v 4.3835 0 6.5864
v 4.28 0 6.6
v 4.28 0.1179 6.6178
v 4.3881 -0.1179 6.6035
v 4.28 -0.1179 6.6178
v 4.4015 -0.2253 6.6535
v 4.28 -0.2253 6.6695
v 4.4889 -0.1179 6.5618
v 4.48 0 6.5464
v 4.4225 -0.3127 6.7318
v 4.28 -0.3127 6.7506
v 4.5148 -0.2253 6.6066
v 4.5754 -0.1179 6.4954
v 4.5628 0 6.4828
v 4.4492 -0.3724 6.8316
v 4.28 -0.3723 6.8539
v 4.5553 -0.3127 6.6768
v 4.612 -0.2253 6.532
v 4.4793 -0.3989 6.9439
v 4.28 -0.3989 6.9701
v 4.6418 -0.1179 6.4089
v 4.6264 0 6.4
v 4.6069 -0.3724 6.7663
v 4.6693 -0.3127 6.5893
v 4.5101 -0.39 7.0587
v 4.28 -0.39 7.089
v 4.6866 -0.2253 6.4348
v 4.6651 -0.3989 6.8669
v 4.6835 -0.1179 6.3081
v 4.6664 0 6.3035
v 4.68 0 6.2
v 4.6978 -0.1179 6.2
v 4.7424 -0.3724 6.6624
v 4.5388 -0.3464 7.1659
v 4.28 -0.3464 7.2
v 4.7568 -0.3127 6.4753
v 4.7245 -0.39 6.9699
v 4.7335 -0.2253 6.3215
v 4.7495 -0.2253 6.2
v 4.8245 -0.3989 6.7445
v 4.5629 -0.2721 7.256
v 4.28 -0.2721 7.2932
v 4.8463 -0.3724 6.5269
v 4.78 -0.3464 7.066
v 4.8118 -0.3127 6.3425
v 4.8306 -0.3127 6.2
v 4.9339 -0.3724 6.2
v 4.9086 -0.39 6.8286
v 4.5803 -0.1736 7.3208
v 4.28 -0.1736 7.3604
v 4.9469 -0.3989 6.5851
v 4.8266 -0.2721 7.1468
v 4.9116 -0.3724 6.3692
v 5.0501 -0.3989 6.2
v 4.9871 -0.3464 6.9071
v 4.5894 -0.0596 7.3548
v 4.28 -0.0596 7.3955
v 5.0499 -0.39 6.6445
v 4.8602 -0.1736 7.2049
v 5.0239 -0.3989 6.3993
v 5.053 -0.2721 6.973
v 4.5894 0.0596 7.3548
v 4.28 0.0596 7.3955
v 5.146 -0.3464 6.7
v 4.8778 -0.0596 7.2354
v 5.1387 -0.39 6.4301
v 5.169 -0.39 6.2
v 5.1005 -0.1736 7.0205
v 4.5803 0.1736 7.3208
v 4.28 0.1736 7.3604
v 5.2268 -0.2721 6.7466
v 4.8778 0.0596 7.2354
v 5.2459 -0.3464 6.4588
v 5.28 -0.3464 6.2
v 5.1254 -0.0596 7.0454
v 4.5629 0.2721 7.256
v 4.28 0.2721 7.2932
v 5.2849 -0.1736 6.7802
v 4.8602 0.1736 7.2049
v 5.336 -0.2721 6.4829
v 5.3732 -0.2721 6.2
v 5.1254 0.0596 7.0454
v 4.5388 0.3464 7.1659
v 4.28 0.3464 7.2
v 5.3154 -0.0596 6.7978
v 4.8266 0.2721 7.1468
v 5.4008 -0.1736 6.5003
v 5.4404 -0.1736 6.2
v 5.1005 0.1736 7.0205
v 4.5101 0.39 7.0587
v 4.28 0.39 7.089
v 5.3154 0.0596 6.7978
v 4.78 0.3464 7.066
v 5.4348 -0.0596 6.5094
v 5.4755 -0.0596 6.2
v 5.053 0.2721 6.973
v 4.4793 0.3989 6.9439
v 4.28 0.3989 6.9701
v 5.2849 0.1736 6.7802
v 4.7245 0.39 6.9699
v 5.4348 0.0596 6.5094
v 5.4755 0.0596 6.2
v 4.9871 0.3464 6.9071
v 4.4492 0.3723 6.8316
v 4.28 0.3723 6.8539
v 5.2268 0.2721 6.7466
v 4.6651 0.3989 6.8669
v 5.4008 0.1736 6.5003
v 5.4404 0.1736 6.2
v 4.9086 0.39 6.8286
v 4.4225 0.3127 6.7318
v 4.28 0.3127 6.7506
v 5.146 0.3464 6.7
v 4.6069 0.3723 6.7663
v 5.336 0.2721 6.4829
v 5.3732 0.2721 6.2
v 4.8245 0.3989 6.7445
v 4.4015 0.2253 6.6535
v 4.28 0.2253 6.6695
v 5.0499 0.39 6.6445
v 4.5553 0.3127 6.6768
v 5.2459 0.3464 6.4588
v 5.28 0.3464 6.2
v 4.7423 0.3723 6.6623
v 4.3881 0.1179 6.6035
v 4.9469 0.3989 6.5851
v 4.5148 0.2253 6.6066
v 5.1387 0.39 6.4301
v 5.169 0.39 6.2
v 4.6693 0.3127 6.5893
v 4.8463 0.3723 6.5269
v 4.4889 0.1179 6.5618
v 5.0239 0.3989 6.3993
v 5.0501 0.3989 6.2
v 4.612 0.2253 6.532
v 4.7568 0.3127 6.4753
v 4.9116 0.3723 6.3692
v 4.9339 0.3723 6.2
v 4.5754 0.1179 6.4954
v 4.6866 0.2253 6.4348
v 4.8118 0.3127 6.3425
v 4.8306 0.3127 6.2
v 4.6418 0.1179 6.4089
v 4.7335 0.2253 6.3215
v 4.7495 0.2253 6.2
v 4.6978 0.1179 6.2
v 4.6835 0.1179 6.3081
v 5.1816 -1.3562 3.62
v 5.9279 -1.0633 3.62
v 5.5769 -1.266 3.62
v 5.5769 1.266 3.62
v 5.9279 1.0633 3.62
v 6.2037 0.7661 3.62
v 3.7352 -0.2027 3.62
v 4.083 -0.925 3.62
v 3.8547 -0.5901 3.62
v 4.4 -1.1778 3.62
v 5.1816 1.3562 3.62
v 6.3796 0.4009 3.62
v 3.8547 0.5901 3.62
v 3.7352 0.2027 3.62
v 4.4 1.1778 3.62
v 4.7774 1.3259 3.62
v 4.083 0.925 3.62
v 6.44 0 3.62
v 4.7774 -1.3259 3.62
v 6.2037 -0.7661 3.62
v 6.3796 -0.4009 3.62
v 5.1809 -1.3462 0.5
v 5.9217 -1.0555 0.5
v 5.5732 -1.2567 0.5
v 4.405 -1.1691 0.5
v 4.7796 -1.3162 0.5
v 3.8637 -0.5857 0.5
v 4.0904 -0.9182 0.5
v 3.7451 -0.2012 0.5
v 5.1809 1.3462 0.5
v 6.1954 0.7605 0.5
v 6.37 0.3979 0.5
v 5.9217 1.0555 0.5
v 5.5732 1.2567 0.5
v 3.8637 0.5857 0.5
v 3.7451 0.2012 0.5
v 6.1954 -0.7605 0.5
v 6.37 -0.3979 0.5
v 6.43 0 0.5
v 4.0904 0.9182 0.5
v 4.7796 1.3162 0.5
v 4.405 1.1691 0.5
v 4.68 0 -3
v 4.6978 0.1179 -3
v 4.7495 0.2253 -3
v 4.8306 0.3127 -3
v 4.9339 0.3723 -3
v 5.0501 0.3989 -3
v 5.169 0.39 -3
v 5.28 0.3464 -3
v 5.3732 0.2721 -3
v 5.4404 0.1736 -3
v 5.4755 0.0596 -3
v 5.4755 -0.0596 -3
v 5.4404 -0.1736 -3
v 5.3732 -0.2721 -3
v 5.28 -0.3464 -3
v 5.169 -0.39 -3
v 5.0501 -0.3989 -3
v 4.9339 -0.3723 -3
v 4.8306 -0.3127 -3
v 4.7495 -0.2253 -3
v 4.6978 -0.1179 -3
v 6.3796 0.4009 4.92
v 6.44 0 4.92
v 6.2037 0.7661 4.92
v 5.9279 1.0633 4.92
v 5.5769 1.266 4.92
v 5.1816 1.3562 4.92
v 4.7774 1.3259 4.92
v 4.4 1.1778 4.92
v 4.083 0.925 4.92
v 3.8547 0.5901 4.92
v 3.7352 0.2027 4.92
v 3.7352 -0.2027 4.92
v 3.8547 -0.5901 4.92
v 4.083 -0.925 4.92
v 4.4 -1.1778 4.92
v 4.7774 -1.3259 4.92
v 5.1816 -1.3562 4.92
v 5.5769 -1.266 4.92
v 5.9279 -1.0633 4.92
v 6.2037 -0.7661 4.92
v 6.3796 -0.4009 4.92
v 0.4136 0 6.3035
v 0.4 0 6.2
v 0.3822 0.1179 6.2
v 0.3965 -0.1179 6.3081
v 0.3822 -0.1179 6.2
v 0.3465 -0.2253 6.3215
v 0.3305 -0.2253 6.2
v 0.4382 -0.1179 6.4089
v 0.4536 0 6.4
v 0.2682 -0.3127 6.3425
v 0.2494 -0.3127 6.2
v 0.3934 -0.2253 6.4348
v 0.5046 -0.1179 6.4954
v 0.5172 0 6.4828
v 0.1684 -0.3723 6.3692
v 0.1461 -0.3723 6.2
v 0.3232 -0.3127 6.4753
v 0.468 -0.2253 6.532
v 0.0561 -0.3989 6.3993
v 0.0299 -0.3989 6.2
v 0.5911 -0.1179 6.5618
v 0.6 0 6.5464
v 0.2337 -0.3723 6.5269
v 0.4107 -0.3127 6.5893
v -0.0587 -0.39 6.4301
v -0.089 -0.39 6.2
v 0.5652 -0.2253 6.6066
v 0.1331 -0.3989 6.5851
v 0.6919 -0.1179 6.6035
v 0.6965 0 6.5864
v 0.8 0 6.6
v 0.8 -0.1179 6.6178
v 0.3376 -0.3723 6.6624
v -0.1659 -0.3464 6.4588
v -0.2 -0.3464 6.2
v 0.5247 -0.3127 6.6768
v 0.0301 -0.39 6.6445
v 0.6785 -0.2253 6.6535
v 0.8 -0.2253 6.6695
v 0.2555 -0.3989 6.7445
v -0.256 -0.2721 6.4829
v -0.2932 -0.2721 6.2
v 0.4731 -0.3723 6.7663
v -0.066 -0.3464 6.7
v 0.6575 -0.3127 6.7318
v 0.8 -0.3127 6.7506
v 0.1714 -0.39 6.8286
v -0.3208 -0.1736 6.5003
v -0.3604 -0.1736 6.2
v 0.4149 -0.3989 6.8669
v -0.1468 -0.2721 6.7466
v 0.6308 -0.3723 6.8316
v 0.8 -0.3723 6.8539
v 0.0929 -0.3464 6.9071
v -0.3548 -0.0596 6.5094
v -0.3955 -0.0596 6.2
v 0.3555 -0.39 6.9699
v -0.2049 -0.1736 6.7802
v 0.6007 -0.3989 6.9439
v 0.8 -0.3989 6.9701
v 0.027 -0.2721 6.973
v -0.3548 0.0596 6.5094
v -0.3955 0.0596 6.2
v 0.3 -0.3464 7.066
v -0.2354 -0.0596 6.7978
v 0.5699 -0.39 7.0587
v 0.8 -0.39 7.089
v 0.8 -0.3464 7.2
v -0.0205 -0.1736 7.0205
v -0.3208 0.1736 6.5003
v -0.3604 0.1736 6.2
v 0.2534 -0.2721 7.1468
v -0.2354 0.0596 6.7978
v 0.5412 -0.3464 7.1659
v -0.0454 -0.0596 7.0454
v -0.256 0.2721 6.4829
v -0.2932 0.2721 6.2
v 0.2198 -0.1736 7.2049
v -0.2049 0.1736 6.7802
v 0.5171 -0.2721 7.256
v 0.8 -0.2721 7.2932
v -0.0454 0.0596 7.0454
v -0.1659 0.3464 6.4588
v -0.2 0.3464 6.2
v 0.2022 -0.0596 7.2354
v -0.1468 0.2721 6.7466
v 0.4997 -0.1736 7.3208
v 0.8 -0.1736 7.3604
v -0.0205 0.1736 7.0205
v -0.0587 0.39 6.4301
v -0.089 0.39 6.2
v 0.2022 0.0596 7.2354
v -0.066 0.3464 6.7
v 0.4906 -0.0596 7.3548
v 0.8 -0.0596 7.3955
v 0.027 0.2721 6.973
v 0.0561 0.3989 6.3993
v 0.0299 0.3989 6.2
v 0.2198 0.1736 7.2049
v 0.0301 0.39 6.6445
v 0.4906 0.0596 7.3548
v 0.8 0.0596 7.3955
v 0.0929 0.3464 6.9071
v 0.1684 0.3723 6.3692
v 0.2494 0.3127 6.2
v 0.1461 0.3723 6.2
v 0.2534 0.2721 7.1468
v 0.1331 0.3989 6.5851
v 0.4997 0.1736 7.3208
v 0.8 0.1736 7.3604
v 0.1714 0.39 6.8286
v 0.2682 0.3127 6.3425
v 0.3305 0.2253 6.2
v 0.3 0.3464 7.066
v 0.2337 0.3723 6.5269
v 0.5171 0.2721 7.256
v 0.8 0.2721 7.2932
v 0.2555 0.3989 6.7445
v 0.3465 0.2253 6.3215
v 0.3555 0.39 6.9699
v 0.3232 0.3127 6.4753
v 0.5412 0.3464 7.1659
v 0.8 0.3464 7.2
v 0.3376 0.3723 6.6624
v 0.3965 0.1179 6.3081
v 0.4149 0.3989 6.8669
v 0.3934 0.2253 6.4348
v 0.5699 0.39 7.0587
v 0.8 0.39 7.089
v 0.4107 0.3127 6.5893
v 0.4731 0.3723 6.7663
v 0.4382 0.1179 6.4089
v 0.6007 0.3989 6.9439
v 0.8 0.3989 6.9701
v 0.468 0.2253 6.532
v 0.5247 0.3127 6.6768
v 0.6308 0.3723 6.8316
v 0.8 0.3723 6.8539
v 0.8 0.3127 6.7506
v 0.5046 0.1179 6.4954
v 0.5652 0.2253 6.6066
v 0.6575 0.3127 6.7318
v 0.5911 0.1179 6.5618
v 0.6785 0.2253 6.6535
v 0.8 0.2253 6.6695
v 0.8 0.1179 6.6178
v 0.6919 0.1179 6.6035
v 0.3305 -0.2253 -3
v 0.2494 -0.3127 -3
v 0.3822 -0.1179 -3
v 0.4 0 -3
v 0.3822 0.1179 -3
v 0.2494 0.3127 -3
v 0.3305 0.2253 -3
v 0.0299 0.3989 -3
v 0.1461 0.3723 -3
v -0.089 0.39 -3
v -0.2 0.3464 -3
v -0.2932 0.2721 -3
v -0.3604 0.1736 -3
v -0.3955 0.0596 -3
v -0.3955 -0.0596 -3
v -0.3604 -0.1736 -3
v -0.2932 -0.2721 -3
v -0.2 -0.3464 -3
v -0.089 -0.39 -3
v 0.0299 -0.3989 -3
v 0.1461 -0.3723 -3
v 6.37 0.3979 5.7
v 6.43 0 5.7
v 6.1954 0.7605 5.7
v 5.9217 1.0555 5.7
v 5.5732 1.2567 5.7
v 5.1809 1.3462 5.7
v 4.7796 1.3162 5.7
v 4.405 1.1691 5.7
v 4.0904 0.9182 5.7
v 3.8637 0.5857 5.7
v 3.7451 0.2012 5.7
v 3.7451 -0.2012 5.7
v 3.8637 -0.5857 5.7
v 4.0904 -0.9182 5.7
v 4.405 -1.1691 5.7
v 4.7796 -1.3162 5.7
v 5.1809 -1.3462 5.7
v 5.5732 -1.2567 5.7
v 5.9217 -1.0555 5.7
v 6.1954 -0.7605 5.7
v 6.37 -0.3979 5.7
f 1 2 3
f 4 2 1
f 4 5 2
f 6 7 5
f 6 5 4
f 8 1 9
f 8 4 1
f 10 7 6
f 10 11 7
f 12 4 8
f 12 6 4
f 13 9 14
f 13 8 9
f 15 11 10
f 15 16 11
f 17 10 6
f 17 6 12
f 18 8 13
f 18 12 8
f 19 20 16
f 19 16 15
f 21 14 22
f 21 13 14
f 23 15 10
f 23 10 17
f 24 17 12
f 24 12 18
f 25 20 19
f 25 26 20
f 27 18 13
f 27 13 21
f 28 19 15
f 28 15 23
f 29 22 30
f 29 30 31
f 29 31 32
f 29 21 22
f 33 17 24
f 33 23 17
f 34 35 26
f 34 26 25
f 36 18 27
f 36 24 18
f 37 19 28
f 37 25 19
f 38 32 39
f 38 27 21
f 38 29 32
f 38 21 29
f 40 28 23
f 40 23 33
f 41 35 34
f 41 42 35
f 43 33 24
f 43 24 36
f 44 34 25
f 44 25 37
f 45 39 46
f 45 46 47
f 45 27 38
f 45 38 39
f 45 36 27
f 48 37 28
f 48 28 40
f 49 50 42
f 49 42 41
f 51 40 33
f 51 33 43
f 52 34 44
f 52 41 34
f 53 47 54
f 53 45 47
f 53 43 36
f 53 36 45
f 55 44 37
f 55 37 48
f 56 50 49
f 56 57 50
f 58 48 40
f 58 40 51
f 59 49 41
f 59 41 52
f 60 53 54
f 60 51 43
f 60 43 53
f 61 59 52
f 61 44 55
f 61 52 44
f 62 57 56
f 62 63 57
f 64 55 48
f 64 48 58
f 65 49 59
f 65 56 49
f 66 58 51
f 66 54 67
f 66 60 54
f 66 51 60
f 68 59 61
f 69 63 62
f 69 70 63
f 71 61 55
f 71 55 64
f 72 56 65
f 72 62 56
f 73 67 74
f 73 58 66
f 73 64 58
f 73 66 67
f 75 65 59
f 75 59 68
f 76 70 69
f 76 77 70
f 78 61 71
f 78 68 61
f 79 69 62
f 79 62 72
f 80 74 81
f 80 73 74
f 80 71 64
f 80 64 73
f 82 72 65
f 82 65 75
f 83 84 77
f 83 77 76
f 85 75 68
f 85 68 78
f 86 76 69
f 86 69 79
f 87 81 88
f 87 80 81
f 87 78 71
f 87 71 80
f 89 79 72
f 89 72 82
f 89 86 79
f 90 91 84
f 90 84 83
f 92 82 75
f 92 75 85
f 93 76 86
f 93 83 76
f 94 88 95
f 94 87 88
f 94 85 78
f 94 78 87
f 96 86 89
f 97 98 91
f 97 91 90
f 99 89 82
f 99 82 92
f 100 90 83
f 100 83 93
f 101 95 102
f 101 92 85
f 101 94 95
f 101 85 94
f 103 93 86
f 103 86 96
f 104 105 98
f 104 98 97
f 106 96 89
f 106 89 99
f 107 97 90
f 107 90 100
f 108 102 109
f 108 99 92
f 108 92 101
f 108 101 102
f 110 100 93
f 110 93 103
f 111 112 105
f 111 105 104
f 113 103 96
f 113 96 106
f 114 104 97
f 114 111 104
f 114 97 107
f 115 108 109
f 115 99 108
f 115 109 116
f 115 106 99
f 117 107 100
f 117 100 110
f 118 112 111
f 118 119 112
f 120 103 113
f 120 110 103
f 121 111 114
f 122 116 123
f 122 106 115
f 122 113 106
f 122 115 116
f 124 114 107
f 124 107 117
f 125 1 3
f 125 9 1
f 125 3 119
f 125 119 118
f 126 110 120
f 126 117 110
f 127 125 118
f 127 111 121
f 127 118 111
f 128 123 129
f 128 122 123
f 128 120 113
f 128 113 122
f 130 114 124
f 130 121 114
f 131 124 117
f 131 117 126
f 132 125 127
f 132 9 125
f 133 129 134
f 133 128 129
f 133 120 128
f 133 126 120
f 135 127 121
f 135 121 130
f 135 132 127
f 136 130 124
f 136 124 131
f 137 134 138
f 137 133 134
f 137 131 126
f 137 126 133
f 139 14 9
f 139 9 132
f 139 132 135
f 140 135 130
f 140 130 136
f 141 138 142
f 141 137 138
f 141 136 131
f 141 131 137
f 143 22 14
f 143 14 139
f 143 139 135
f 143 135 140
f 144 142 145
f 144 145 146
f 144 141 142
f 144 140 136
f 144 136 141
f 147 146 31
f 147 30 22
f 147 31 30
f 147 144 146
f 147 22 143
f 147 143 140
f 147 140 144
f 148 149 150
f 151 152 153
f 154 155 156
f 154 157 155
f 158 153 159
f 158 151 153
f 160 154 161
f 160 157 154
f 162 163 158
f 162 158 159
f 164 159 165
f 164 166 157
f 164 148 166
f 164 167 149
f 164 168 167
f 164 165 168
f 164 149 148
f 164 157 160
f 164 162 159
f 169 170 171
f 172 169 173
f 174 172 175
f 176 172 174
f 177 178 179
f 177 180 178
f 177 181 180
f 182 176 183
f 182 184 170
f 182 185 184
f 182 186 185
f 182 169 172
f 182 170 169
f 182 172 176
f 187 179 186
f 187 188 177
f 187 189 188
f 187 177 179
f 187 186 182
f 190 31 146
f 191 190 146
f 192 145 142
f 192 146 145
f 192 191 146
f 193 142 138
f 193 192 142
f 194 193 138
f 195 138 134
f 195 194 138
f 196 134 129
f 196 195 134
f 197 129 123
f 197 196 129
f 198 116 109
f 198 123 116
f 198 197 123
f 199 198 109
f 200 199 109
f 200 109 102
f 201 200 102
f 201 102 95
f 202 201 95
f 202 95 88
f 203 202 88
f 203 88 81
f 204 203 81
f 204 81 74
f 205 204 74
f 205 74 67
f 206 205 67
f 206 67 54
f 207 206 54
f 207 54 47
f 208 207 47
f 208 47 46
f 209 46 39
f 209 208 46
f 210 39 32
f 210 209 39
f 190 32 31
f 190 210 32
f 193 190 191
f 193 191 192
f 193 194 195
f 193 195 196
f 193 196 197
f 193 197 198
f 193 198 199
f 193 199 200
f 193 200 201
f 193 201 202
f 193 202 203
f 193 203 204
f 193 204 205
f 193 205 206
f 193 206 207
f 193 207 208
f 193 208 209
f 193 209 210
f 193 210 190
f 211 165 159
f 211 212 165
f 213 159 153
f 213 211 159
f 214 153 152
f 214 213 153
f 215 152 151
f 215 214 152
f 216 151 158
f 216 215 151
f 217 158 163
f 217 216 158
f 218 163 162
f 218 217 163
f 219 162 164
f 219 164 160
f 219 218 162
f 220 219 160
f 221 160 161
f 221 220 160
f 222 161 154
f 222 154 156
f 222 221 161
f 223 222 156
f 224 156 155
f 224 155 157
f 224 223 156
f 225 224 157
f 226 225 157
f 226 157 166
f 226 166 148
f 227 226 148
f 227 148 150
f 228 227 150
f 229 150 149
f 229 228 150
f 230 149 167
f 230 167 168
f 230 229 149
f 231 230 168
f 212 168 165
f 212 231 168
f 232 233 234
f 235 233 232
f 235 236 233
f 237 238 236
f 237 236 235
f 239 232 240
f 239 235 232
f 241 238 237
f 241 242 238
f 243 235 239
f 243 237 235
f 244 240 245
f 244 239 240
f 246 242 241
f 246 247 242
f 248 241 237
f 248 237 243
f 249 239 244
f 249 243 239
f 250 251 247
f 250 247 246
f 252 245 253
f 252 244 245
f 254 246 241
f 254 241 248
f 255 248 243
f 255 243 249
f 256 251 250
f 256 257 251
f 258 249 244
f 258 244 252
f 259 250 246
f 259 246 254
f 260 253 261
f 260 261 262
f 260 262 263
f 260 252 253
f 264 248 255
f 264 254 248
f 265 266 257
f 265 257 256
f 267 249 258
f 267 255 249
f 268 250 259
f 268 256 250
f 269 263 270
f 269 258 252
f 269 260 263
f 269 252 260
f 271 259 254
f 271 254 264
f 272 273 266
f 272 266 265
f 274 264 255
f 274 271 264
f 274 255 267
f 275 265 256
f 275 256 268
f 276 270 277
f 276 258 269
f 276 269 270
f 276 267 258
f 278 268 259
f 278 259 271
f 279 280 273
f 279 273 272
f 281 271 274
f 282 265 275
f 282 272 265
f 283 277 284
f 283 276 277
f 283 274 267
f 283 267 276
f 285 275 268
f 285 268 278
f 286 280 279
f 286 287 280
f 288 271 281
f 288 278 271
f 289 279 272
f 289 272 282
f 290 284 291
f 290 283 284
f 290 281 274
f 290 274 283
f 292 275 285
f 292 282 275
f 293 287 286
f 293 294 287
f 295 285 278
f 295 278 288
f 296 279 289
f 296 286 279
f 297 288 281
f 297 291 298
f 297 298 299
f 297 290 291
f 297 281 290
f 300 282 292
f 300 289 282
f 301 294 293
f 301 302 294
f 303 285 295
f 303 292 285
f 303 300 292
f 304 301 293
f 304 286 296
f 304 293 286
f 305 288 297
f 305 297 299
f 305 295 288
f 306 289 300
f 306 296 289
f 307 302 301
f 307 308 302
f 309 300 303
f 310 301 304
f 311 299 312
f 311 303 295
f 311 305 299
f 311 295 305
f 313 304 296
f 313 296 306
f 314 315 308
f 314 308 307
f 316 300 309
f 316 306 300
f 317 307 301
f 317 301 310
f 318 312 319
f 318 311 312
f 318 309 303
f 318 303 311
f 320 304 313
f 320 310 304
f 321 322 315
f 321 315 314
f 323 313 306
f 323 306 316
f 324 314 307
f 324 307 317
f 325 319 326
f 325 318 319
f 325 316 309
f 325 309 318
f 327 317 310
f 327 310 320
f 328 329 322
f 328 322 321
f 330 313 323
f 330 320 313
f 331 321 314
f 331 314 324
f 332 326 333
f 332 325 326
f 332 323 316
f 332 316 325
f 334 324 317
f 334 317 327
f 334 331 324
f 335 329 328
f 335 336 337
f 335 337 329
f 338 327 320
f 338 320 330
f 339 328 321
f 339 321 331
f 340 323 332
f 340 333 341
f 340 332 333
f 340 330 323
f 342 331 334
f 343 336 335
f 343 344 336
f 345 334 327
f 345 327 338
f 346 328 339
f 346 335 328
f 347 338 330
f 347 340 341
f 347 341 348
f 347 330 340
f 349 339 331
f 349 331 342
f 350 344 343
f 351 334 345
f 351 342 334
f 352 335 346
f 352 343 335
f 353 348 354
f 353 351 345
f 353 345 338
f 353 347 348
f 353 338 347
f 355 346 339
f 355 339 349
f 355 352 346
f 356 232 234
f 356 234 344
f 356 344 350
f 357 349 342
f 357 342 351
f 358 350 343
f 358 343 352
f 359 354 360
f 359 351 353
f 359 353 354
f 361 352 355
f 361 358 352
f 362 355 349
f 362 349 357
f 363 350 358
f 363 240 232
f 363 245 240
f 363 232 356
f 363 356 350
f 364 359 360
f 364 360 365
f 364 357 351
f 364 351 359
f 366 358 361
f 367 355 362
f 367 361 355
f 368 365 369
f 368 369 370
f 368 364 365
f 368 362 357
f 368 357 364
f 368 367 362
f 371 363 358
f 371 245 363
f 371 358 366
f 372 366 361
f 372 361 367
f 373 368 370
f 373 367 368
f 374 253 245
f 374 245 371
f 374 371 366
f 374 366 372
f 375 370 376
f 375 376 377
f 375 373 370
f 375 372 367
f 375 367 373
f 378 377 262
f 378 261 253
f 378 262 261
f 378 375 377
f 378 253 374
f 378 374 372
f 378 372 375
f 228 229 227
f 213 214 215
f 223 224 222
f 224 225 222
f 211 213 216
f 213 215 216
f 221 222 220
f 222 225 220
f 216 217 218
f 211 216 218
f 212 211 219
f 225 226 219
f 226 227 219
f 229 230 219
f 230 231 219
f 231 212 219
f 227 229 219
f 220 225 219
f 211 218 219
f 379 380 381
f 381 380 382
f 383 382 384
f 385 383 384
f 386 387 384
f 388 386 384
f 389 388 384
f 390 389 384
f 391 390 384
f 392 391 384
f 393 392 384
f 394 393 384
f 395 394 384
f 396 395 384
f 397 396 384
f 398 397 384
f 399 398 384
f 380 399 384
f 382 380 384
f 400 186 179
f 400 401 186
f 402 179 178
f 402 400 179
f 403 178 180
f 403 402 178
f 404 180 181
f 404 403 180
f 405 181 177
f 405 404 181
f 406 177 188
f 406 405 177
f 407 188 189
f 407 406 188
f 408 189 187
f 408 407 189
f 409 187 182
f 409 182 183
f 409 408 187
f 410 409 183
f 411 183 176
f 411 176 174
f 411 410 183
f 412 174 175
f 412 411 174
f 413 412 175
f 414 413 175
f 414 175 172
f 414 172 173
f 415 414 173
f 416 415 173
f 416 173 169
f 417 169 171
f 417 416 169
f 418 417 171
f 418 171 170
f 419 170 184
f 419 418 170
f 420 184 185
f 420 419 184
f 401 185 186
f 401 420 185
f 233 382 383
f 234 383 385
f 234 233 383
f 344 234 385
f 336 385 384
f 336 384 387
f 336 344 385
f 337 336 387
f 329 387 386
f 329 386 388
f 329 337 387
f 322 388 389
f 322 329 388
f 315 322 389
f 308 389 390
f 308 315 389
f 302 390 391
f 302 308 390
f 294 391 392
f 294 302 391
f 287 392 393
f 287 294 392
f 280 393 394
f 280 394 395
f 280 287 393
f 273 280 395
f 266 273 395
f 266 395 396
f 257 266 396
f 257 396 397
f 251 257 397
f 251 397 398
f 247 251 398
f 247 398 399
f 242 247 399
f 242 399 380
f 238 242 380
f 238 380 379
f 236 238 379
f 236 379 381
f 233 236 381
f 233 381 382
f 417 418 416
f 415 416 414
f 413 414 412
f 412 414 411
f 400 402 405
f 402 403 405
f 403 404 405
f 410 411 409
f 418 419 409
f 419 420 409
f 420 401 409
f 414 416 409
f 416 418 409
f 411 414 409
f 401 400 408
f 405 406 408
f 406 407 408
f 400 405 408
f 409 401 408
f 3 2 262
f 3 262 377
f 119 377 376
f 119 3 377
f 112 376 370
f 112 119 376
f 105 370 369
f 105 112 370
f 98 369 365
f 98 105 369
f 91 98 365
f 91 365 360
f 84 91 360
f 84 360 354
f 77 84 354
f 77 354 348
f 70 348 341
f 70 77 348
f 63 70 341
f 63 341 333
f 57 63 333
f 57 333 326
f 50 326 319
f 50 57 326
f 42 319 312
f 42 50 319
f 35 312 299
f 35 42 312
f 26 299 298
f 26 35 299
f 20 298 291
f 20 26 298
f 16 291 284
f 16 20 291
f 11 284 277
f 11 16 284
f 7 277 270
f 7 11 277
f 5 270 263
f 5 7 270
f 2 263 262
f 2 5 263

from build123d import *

# Parameters (mm, degrees)
SKETCH001_R = 0.4
SKETCH002_W = 1.35
SKETCH002_H = 5.2
SKETCH003_W = 1.36
SKETCH003_H = 1.3


with BuildPart() as sweep_body:
    # Sweep: sweep along a path in Sketch
    with BuildLine(Plane.XZ) as sweep_path:
        Line((0, -3), (0, 6.2))
        ThreePointArc((0, 6.2), (0.234315, 6.765685), (0.8, 7))
        Line((0.8, 7), (4.28, 7))
        ThreePointArc((4.28, 7), (4.845685, 6.765685), (5.08, 6.2))
        Line((5.08, 6.2), (5.08, -3))
    # Sketch001 → Sweep (sweep)
    with BuildSketch(Plane.XY):
        Circle(SKETCH001_R)
    sweep(path=sweep_path.line)


with BuildPart() as revolution:
    # Sketch002 → Revolution (revolve)
    with BuildSketch(Plane.XZ):
        with Locations((5.755, 3.1)):
            Rectangle(SKETCH002_W, SKETCH002_H)
    revolve(axis=Axis((5.08, 0, 0.5), (0, 0, 1)))


with BuildPart() as revolution001:
    # Sketch003 → Revolution001 (revolve)
    with BuildSketch(Plane.XZ):
        with Locations((5.76, 4.27)):
            Rectangle(SKETCH003_W, SKETCH003_H)
    revolve(axis=Axis((5.08, 0, 3.62), (0, 0, 1)))


solid = Compound([sweep_body.part, revolution.part, revolution001.part])
